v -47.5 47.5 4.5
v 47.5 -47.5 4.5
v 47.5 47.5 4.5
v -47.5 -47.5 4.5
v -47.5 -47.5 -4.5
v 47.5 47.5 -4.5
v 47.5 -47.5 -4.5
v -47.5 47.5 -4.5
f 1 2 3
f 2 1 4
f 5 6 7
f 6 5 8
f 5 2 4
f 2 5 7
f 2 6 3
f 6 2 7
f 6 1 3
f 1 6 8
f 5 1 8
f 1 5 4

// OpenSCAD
$fn=64;

plate_size = 95.0;
thickness = 9.0;

module square_plate(size, t){
    translate([-size/2, -size/2, -t/2])
        cube([size, size, t], center=false);
}

square_plate(plate_size, thickness);
